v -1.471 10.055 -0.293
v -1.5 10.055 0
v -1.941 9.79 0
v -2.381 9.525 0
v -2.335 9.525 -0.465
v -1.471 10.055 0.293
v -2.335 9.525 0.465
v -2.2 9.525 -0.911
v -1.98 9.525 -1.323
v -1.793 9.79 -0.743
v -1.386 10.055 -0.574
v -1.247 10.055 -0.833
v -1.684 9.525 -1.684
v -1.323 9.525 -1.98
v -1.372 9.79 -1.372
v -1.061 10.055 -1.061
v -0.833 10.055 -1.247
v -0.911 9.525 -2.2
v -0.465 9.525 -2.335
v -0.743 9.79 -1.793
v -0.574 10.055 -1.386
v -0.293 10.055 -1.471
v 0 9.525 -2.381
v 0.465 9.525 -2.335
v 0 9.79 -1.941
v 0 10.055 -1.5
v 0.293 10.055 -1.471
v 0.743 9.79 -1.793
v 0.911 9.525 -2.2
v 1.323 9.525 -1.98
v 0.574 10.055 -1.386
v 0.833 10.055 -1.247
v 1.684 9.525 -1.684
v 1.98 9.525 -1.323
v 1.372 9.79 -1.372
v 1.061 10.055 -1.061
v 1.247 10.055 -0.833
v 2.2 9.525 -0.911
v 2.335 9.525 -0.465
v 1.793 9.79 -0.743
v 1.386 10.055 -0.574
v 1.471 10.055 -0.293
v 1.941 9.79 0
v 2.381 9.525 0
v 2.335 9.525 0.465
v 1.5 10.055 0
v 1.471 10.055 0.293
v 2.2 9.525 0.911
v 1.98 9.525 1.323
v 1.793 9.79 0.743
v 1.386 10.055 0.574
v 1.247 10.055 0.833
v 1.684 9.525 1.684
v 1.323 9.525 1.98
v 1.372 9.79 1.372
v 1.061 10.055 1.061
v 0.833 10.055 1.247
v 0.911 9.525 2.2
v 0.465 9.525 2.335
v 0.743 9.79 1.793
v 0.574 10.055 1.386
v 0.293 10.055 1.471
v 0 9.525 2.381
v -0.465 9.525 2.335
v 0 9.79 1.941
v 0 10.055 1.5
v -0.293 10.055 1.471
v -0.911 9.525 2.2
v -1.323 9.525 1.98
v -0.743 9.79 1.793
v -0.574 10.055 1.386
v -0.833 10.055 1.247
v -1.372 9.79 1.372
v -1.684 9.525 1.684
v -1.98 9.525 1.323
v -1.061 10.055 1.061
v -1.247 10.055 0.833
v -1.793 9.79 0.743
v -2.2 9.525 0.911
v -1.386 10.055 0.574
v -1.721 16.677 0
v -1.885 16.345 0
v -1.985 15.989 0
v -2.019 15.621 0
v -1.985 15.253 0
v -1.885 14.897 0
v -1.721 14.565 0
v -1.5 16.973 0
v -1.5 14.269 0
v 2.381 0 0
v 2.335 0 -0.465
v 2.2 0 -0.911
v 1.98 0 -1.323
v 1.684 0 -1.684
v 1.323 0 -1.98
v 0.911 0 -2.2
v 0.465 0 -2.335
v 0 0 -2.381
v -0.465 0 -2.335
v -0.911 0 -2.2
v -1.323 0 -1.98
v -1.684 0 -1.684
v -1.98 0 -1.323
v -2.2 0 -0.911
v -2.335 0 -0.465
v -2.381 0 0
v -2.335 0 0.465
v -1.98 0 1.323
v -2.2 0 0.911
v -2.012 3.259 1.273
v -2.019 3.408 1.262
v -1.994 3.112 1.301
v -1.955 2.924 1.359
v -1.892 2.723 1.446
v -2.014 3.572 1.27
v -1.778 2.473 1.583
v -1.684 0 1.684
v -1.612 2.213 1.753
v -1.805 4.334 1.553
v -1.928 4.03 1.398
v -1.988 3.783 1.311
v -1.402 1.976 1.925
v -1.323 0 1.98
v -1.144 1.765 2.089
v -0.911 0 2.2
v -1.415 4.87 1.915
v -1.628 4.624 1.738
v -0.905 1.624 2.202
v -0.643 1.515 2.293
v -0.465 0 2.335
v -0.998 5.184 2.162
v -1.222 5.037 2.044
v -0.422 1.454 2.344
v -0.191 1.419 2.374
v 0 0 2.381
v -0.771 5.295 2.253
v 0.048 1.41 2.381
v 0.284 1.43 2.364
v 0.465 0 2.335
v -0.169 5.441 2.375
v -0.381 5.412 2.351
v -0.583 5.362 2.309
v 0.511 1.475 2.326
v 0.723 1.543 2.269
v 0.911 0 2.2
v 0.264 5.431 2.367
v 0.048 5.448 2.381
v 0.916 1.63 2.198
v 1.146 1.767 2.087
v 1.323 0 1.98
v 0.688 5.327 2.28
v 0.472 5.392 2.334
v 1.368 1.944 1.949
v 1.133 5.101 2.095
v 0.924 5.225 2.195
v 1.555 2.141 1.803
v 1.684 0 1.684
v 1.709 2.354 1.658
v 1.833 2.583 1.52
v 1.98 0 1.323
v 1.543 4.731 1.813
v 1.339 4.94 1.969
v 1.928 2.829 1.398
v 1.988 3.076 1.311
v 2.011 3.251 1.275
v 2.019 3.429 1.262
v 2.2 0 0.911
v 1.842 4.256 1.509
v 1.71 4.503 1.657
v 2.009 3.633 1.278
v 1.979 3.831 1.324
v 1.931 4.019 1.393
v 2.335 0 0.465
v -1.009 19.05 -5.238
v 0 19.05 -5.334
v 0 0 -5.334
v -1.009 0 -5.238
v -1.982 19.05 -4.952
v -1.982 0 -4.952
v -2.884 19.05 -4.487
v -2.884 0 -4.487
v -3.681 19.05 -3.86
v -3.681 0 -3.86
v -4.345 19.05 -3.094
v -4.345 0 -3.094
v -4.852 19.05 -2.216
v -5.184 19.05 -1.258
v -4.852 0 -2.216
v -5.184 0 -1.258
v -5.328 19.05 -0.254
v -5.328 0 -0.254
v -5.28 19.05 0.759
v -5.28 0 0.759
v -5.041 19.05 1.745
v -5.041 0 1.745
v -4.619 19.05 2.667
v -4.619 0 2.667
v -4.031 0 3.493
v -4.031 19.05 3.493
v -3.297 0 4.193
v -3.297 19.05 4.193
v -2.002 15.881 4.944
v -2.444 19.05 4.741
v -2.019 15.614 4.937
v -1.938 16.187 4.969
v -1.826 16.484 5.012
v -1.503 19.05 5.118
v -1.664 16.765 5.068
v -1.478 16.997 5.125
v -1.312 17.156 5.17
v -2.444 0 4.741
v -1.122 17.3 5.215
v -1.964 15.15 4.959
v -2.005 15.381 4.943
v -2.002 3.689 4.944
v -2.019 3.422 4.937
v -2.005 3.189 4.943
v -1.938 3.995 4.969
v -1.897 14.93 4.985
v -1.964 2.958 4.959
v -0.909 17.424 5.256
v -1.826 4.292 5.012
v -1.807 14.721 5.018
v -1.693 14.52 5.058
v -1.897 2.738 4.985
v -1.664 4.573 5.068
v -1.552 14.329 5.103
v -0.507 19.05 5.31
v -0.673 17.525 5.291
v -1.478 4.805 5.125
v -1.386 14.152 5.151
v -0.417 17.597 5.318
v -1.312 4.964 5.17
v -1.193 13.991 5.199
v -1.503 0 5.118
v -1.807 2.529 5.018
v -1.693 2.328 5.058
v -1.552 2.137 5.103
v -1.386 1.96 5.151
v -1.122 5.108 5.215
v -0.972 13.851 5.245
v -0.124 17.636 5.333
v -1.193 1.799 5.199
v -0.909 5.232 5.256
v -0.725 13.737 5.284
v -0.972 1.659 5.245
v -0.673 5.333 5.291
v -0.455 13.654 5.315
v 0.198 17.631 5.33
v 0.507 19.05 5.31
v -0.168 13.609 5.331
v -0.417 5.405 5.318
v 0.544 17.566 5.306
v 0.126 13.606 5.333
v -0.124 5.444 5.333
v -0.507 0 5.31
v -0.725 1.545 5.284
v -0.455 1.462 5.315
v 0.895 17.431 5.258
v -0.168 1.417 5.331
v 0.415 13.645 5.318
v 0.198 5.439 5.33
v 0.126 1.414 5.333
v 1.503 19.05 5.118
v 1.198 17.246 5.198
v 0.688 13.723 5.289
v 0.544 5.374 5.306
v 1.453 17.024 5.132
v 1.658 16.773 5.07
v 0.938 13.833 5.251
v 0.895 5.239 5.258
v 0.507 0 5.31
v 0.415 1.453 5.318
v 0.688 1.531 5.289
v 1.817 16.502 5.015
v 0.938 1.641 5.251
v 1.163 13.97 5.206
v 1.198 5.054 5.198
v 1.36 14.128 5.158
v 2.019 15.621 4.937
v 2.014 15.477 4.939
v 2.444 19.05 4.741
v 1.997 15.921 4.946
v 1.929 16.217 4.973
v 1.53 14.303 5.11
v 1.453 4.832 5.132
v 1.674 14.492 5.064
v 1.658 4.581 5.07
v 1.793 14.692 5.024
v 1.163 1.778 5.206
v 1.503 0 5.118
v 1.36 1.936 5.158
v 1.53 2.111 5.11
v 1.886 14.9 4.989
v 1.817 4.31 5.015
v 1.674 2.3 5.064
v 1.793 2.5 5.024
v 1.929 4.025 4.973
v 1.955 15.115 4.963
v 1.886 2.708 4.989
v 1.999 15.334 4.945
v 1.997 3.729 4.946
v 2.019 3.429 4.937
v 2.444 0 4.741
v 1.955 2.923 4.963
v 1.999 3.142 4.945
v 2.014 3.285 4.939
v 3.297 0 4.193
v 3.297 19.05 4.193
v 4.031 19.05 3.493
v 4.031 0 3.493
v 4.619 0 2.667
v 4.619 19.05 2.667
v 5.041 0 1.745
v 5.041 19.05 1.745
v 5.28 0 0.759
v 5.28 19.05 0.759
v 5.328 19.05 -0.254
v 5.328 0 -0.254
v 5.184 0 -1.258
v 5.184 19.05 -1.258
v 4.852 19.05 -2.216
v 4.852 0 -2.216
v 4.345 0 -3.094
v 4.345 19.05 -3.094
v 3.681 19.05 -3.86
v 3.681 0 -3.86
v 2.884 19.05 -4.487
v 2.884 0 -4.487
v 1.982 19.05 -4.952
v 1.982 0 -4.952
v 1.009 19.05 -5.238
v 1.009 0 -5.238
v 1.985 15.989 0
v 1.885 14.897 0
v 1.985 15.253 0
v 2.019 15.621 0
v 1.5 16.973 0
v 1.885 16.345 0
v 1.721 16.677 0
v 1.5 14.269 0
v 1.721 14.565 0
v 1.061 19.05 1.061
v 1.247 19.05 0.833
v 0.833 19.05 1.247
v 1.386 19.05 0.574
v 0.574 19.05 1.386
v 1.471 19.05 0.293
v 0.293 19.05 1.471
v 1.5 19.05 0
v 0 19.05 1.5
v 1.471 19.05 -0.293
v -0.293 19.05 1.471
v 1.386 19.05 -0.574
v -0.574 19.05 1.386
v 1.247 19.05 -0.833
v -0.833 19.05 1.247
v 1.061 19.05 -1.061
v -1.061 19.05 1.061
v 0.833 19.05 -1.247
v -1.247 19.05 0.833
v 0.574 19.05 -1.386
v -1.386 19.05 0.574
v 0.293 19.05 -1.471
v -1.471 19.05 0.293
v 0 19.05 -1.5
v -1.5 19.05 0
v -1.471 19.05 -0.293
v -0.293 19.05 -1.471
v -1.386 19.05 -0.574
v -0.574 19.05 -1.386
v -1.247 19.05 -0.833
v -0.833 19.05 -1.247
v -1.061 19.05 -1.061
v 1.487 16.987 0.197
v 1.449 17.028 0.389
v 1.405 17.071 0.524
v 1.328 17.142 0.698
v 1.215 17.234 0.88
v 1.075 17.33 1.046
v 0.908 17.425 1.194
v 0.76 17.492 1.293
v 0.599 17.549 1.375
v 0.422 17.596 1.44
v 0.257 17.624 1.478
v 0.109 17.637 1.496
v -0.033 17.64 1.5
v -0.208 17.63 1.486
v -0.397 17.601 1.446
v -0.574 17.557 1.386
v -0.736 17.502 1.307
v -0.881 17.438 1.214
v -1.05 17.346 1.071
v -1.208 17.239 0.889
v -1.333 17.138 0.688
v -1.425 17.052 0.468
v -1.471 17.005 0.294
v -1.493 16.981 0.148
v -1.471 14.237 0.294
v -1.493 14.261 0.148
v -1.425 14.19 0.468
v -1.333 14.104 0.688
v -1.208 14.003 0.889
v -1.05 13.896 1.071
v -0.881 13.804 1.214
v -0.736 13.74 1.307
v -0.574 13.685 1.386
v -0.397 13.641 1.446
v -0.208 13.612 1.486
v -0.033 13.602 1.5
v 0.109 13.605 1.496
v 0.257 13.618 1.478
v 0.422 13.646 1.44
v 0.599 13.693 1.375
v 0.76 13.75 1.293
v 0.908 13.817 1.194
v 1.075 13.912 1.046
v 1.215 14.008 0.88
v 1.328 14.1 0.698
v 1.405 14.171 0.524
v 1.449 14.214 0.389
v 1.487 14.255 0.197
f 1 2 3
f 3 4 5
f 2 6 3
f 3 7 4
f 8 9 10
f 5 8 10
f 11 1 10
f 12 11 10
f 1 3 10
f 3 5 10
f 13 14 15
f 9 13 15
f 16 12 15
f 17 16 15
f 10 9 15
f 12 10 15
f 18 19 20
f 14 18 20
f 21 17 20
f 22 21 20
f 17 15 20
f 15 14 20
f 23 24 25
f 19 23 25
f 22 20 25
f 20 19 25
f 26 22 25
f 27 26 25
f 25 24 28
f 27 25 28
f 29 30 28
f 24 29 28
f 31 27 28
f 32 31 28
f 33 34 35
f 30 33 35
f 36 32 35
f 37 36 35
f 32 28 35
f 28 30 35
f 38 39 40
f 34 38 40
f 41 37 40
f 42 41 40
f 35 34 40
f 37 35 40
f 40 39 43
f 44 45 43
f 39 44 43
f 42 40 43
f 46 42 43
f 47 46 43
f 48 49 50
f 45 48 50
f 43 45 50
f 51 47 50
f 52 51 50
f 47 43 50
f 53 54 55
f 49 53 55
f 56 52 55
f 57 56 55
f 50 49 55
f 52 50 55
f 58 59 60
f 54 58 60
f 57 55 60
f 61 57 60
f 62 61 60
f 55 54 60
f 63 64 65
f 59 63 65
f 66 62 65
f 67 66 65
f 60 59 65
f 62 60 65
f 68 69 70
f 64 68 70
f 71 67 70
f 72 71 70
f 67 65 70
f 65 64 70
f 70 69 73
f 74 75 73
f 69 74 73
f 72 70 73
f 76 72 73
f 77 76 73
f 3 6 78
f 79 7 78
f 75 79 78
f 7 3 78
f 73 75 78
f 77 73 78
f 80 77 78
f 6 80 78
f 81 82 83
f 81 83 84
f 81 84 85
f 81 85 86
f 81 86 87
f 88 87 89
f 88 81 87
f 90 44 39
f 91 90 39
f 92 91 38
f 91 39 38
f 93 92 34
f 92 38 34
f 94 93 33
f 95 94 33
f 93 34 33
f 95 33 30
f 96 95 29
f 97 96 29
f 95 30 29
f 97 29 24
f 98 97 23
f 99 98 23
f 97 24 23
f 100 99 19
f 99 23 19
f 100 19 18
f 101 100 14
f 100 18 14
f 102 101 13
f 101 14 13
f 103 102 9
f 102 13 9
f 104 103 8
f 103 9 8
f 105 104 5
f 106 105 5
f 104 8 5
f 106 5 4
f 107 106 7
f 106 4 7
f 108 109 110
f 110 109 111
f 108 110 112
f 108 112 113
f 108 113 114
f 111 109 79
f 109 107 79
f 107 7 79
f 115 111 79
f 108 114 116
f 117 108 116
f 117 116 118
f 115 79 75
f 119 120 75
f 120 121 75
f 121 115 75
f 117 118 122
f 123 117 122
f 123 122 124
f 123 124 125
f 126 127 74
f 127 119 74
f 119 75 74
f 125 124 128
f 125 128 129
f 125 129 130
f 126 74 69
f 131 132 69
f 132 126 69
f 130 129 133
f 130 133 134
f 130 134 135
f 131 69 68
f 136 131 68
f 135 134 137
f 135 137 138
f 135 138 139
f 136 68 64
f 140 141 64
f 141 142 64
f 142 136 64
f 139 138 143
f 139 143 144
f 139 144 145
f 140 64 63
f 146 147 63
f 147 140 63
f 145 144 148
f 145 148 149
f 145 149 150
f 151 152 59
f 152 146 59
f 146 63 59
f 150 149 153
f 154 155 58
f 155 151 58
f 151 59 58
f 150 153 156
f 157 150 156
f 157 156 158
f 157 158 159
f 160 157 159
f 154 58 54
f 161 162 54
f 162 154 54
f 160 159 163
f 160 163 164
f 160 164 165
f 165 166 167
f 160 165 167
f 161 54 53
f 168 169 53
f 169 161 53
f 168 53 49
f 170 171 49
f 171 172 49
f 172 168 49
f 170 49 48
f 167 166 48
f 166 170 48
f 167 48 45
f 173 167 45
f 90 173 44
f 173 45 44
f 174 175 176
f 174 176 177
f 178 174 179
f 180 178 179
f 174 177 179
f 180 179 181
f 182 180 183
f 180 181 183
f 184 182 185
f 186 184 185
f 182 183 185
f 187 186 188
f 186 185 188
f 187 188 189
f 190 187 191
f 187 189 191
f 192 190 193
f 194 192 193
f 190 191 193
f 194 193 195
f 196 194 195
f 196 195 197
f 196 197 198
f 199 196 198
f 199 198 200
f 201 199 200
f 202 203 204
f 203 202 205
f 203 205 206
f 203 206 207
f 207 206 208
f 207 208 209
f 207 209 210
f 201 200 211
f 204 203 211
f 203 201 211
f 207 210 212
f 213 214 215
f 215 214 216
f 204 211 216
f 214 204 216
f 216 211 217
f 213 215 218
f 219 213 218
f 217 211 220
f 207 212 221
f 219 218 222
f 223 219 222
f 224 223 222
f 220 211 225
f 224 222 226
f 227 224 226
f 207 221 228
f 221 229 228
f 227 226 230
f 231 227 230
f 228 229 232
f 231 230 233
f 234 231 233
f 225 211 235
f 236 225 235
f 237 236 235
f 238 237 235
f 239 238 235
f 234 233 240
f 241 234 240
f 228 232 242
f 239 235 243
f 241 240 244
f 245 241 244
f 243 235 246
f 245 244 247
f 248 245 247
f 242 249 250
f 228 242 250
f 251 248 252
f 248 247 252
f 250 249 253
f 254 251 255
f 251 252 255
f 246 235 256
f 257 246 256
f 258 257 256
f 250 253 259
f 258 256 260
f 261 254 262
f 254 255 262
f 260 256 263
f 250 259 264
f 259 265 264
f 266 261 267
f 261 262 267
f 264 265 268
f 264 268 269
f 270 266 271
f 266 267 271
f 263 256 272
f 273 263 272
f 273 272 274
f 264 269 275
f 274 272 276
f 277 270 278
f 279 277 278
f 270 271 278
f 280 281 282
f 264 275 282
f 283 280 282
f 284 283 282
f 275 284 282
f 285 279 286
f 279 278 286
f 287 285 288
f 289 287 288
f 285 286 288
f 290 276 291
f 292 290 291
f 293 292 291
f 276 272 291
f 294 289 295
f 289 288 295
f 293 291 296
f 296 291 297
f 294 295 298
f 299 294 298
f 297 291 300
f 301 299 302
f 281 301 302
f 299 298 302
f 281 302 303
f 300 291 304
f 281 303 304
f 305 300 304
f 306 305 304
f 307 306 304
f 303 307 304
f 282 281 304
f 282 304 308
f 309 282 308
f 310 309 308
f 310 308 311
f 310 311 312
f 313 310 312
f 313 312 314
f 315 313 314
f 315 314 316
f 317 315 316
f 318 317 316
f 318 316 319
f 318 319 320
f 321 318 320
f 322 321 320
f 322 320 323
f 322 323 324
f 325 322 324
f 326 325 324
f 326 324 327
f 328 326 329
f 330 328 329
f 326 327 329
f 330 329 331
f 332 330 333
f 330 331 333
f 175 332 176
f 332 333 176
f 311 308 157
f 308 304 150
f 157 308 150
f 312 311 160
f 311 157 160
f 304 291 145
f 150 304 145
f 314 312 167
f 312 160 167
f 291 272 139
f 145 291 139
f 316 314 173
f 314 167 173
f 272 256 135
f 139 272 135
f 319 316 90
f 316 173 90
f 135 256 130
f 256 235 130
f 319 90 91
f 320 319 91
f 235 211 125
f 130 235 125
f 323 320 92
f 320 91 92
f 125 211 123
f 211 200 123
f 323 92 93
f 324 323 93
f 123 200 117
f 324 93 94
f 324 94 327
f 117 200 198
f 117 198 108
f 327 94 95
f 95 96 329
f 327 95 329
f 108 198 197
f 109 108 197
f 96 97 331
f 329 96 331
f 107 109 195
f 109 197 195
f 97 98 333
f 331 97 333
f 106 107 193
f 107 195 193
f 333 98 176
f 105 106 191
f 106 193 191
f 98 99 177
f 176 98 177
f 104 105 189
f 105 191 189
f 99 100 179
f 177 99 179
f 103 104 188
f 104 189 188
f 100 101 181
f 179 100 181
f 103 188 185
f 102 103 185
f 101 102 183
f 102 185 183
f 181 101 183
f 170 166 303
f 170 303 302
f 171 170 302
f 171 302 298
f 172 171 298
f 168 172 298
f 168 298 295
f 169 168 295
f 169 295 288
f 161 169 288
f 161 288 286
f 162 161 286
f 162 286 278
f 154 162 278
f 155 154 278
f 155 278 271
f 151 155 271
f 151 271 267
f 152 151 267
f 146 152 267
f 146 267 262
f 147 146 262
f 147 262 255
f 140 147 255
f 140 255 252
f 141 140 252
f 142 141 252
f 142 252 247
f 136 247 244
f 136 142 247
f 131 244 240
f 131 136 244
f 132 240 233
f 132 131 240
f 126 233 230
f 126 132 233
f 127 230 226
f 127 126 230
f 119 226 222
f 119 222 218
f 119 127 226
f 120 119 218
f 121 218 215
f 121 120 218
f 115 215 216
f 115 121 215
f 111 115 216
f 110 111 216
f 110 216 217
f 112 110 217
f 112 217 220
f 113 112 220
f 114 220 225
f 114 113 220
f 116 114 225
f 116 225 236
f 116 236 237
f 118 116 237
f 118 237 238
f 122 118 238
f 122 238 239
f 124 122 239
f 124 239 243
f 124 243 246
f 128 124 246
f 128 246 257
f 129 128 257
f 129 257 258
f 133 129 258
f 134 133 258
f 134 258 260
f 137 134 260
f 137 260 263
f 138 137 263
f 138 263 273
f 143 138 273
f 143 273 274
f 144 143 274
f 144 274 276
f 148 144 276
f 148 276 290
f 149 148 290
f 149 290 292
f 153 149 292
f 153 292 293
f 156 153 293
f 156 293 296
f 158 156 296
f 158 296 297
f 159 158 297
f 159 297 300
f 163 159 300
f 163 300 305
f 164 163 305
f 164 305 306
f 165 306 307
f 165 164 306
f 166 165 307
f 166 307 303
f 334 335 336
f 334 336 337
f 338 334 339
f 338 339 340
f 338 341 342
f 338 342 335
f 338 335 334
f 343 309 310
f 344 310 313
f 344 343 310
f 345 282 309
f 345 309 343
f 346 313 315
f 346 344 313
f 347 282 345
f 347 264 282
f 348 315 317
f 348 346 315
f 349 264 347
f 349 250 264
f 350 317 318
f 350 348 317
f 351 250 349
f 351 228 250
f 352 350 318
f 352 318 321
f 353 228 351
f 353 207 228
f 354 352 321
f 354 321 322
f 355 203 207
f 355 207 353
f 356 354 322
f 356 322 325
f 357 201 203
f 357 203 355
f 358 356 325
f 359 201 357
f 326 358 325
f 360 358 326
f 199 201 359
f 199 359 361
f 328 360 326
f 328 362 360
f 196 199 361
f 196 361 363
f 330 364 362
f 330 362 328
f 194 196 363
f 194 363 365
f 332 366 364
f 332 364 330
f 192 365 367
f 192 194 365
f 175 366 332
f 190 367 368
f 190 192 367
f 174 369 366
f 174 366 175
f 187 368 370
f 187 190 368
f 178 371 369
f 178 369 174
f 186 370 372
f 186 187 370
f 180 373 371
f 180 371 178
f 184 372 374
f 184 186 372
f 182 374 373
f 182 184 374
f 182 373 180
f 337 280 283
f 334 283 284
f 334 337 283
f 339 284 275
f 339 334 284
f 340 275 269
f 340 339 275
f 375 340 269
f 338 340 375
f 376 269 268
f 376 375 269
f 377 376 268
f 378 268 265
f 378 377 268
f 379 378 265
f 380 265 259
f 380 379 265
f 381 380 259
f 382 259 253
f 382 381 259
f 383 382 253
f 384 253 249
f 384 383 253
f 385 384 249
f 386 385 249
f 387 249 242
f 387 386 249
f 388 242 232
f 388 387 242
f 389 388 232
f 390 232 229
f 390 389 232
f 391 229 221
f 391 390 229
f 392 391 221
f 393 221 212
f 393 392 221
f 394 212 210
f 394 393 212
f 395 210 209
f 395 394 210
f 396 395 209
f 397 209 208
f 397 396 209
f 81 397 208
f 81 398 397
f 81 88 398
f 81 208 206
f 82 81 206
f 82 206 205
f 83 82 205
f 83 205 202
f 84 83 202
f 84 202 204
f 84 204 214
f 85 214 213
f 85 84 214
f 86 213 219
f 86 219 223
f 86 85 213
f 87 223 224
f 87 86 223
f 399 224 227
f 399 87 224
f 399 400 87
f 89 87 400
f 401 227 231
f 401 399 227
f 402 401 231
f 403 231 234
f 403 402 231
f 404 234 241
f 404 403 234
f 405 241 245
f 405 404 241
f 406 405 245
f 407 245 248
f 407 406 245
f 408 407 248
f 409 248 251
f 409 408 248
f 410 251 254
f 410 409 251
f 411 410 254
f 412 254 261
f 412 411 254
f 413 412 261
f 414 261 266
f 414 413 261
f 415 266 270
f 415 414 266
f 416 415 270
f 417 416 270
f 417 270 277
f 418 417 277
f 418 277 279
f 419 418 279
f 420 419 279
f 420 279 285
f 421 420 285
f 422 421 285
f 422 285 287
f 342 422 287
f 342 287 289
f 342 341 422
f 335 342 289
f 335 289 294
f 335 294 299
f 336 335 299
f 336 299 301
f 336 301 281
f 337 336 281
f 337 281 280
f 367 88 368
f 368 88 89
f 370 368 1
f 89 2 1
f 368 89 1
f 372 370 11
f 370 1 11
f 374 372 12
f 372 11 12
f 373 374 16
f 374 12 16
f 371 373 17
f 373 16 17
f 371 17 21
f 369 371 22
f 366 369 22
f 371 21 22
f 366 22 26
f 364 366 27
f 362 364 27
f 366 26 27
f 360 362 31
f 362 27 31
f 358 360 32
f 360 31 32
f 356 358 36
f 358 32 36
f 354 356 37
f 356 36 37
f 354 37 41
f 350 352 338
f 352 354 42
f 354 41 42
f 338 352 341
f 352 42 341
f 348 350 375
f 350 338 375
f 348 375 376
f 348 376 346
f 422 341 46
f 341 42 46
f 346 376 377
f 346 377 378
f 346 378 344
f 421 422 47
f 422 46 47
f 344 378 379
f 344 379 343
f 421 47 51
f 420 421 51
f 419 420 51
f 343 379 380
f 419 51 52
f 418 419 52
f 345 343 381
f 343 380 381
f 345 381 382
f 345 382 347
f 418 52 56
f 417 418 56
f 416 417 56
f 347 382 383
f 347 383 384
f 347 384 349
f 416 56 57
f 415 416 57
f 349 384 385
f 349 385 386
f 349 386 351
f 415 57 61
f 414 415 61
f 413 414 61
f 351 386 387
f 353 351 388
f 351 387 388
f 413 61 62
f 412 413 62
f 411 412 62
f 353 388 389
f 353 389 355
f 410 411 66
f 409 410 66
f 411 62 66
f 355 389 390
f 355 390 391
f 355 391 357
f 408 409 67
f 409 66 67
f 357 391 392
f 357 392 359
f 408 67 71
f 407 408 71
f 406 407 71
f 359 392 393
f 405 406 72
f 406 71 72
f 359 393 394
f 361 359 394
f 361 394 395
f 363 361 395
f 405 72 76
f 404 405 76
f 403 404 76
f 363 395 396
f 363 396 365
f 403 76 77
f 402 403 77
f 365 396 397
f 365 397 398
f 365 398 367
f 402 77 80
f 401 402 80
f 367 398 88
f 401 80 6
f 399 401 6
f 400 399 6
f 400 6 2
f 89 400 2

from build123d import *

# Parameters (mm, degrees)
SKETCH1_R                       = 5.334
BOSS_EXTRUDE1_DEPTH             = 19.05
F_3_0MM_DOWEL_HOLE3_D           = 3
F_3_0MM_DOWEL_HOLE3_DEPTH       = 9.525
F_3_0MM_DOWEL_HOLE3_TIP         = 0.901290929
F_3_16_0_1875_DOWEL_HOLE1_D     = 4.7625
F_3_16_0_1875_DOWEL_HOLE1_DEPTH = 9.525
F_3_16_0_1875_DOWEL_HOLE1_TIP   = 1.430799349
F_10_32_TAPPED_HOLE1_OUTLINE_R  = 2.0193
F_10_32_TAPPED_HOLE1_DEPTH      = 6


with BuildPart() as part:
    # Sketch1 → Boss-Extrude1 (new body)
    with BuildSketch(Plane(origin=(0, 0, 0), x_dir=(1, 0, 0), z_dir=(0, 1, 0))):
        with Locations(Location((0, 0, 0), (0, 0, 90))):
            Circle(SKETCH1_R)
    extrude(amount=BOSS_EXTRUDE1_DEPTH)

    # Ø3.0mm Dowel Hole3
    with Locations(Plane(origin=(0, 19.05, 0), x_dir=(1, 0, 0), z_dir=(0, 1, 0))):
        with Locations((0, 0)):
            Hole(F_3_0MM_DOWEL_HOLE3_D / 2, depth=F_3_0MM_DOWEL_HOLE3_DEPTH)
            with Locations((0, 0, -(F_3_0MM_DOWEL_HOLE3_DEPTH + F_3_0MM_DOWEL_HOLE3_TIP / 2))):  # 118° drill point
                Cone(0, F_3_0MM_DOWEL_HOLE3_D / 2, F_3_0MM_DOWEL_HOLE3_TIP, mode=Mode.SUBTRACT)

    # 3/16 (0.1875) Dowel Hole1
    with Locations(Plane(origin=(0, 0, 0), x_dir=(-1, 0, 0), z_dir=(0, -1, 0))):
        with Locations((0, 0)):
            Hole(F_3_16_0_1875_DOWEL_HOLE1_D / 2, depth=F_3_16_0_1875_DOWEL_HOLE1_DEPTH)
            with Locations((0, 0, -(F_3_16_0_1875_DOWEL_HOLE1_DEPTH + F_3_16_0_1875_DOWEL_HOLE1_TIP / 2))):  # 118° drill point
                Cone(0, F_3_16_0_1875_DOWEL_HOLE1_D / 2, F_3_16_0_1875_DOWEL_HOLE1_TIP, mode=Mode.SUBTRACT)

    # #10-32 Tapped Hole1: read off the stored shape, not the designer's step
    # #10-32 Tapped Hole1 outline → #10-32 Tapped Hole1 (cut)
    with BuildSketch(Plane.XY):
        with Locations((0, 3.429)):
            Circle(F_10_32_TAPPED_HOLE1_OUTLINE_R)
        with Locations((0, 15.621)):
            Circle(F_10_32_TAPPED_HOLE1_OUTLINE_R)
    extrude(amount=F_10_32_TAPPED_HOLE1_DEPTH, mode=Mode.SUBTRACT)


solid = part.part
